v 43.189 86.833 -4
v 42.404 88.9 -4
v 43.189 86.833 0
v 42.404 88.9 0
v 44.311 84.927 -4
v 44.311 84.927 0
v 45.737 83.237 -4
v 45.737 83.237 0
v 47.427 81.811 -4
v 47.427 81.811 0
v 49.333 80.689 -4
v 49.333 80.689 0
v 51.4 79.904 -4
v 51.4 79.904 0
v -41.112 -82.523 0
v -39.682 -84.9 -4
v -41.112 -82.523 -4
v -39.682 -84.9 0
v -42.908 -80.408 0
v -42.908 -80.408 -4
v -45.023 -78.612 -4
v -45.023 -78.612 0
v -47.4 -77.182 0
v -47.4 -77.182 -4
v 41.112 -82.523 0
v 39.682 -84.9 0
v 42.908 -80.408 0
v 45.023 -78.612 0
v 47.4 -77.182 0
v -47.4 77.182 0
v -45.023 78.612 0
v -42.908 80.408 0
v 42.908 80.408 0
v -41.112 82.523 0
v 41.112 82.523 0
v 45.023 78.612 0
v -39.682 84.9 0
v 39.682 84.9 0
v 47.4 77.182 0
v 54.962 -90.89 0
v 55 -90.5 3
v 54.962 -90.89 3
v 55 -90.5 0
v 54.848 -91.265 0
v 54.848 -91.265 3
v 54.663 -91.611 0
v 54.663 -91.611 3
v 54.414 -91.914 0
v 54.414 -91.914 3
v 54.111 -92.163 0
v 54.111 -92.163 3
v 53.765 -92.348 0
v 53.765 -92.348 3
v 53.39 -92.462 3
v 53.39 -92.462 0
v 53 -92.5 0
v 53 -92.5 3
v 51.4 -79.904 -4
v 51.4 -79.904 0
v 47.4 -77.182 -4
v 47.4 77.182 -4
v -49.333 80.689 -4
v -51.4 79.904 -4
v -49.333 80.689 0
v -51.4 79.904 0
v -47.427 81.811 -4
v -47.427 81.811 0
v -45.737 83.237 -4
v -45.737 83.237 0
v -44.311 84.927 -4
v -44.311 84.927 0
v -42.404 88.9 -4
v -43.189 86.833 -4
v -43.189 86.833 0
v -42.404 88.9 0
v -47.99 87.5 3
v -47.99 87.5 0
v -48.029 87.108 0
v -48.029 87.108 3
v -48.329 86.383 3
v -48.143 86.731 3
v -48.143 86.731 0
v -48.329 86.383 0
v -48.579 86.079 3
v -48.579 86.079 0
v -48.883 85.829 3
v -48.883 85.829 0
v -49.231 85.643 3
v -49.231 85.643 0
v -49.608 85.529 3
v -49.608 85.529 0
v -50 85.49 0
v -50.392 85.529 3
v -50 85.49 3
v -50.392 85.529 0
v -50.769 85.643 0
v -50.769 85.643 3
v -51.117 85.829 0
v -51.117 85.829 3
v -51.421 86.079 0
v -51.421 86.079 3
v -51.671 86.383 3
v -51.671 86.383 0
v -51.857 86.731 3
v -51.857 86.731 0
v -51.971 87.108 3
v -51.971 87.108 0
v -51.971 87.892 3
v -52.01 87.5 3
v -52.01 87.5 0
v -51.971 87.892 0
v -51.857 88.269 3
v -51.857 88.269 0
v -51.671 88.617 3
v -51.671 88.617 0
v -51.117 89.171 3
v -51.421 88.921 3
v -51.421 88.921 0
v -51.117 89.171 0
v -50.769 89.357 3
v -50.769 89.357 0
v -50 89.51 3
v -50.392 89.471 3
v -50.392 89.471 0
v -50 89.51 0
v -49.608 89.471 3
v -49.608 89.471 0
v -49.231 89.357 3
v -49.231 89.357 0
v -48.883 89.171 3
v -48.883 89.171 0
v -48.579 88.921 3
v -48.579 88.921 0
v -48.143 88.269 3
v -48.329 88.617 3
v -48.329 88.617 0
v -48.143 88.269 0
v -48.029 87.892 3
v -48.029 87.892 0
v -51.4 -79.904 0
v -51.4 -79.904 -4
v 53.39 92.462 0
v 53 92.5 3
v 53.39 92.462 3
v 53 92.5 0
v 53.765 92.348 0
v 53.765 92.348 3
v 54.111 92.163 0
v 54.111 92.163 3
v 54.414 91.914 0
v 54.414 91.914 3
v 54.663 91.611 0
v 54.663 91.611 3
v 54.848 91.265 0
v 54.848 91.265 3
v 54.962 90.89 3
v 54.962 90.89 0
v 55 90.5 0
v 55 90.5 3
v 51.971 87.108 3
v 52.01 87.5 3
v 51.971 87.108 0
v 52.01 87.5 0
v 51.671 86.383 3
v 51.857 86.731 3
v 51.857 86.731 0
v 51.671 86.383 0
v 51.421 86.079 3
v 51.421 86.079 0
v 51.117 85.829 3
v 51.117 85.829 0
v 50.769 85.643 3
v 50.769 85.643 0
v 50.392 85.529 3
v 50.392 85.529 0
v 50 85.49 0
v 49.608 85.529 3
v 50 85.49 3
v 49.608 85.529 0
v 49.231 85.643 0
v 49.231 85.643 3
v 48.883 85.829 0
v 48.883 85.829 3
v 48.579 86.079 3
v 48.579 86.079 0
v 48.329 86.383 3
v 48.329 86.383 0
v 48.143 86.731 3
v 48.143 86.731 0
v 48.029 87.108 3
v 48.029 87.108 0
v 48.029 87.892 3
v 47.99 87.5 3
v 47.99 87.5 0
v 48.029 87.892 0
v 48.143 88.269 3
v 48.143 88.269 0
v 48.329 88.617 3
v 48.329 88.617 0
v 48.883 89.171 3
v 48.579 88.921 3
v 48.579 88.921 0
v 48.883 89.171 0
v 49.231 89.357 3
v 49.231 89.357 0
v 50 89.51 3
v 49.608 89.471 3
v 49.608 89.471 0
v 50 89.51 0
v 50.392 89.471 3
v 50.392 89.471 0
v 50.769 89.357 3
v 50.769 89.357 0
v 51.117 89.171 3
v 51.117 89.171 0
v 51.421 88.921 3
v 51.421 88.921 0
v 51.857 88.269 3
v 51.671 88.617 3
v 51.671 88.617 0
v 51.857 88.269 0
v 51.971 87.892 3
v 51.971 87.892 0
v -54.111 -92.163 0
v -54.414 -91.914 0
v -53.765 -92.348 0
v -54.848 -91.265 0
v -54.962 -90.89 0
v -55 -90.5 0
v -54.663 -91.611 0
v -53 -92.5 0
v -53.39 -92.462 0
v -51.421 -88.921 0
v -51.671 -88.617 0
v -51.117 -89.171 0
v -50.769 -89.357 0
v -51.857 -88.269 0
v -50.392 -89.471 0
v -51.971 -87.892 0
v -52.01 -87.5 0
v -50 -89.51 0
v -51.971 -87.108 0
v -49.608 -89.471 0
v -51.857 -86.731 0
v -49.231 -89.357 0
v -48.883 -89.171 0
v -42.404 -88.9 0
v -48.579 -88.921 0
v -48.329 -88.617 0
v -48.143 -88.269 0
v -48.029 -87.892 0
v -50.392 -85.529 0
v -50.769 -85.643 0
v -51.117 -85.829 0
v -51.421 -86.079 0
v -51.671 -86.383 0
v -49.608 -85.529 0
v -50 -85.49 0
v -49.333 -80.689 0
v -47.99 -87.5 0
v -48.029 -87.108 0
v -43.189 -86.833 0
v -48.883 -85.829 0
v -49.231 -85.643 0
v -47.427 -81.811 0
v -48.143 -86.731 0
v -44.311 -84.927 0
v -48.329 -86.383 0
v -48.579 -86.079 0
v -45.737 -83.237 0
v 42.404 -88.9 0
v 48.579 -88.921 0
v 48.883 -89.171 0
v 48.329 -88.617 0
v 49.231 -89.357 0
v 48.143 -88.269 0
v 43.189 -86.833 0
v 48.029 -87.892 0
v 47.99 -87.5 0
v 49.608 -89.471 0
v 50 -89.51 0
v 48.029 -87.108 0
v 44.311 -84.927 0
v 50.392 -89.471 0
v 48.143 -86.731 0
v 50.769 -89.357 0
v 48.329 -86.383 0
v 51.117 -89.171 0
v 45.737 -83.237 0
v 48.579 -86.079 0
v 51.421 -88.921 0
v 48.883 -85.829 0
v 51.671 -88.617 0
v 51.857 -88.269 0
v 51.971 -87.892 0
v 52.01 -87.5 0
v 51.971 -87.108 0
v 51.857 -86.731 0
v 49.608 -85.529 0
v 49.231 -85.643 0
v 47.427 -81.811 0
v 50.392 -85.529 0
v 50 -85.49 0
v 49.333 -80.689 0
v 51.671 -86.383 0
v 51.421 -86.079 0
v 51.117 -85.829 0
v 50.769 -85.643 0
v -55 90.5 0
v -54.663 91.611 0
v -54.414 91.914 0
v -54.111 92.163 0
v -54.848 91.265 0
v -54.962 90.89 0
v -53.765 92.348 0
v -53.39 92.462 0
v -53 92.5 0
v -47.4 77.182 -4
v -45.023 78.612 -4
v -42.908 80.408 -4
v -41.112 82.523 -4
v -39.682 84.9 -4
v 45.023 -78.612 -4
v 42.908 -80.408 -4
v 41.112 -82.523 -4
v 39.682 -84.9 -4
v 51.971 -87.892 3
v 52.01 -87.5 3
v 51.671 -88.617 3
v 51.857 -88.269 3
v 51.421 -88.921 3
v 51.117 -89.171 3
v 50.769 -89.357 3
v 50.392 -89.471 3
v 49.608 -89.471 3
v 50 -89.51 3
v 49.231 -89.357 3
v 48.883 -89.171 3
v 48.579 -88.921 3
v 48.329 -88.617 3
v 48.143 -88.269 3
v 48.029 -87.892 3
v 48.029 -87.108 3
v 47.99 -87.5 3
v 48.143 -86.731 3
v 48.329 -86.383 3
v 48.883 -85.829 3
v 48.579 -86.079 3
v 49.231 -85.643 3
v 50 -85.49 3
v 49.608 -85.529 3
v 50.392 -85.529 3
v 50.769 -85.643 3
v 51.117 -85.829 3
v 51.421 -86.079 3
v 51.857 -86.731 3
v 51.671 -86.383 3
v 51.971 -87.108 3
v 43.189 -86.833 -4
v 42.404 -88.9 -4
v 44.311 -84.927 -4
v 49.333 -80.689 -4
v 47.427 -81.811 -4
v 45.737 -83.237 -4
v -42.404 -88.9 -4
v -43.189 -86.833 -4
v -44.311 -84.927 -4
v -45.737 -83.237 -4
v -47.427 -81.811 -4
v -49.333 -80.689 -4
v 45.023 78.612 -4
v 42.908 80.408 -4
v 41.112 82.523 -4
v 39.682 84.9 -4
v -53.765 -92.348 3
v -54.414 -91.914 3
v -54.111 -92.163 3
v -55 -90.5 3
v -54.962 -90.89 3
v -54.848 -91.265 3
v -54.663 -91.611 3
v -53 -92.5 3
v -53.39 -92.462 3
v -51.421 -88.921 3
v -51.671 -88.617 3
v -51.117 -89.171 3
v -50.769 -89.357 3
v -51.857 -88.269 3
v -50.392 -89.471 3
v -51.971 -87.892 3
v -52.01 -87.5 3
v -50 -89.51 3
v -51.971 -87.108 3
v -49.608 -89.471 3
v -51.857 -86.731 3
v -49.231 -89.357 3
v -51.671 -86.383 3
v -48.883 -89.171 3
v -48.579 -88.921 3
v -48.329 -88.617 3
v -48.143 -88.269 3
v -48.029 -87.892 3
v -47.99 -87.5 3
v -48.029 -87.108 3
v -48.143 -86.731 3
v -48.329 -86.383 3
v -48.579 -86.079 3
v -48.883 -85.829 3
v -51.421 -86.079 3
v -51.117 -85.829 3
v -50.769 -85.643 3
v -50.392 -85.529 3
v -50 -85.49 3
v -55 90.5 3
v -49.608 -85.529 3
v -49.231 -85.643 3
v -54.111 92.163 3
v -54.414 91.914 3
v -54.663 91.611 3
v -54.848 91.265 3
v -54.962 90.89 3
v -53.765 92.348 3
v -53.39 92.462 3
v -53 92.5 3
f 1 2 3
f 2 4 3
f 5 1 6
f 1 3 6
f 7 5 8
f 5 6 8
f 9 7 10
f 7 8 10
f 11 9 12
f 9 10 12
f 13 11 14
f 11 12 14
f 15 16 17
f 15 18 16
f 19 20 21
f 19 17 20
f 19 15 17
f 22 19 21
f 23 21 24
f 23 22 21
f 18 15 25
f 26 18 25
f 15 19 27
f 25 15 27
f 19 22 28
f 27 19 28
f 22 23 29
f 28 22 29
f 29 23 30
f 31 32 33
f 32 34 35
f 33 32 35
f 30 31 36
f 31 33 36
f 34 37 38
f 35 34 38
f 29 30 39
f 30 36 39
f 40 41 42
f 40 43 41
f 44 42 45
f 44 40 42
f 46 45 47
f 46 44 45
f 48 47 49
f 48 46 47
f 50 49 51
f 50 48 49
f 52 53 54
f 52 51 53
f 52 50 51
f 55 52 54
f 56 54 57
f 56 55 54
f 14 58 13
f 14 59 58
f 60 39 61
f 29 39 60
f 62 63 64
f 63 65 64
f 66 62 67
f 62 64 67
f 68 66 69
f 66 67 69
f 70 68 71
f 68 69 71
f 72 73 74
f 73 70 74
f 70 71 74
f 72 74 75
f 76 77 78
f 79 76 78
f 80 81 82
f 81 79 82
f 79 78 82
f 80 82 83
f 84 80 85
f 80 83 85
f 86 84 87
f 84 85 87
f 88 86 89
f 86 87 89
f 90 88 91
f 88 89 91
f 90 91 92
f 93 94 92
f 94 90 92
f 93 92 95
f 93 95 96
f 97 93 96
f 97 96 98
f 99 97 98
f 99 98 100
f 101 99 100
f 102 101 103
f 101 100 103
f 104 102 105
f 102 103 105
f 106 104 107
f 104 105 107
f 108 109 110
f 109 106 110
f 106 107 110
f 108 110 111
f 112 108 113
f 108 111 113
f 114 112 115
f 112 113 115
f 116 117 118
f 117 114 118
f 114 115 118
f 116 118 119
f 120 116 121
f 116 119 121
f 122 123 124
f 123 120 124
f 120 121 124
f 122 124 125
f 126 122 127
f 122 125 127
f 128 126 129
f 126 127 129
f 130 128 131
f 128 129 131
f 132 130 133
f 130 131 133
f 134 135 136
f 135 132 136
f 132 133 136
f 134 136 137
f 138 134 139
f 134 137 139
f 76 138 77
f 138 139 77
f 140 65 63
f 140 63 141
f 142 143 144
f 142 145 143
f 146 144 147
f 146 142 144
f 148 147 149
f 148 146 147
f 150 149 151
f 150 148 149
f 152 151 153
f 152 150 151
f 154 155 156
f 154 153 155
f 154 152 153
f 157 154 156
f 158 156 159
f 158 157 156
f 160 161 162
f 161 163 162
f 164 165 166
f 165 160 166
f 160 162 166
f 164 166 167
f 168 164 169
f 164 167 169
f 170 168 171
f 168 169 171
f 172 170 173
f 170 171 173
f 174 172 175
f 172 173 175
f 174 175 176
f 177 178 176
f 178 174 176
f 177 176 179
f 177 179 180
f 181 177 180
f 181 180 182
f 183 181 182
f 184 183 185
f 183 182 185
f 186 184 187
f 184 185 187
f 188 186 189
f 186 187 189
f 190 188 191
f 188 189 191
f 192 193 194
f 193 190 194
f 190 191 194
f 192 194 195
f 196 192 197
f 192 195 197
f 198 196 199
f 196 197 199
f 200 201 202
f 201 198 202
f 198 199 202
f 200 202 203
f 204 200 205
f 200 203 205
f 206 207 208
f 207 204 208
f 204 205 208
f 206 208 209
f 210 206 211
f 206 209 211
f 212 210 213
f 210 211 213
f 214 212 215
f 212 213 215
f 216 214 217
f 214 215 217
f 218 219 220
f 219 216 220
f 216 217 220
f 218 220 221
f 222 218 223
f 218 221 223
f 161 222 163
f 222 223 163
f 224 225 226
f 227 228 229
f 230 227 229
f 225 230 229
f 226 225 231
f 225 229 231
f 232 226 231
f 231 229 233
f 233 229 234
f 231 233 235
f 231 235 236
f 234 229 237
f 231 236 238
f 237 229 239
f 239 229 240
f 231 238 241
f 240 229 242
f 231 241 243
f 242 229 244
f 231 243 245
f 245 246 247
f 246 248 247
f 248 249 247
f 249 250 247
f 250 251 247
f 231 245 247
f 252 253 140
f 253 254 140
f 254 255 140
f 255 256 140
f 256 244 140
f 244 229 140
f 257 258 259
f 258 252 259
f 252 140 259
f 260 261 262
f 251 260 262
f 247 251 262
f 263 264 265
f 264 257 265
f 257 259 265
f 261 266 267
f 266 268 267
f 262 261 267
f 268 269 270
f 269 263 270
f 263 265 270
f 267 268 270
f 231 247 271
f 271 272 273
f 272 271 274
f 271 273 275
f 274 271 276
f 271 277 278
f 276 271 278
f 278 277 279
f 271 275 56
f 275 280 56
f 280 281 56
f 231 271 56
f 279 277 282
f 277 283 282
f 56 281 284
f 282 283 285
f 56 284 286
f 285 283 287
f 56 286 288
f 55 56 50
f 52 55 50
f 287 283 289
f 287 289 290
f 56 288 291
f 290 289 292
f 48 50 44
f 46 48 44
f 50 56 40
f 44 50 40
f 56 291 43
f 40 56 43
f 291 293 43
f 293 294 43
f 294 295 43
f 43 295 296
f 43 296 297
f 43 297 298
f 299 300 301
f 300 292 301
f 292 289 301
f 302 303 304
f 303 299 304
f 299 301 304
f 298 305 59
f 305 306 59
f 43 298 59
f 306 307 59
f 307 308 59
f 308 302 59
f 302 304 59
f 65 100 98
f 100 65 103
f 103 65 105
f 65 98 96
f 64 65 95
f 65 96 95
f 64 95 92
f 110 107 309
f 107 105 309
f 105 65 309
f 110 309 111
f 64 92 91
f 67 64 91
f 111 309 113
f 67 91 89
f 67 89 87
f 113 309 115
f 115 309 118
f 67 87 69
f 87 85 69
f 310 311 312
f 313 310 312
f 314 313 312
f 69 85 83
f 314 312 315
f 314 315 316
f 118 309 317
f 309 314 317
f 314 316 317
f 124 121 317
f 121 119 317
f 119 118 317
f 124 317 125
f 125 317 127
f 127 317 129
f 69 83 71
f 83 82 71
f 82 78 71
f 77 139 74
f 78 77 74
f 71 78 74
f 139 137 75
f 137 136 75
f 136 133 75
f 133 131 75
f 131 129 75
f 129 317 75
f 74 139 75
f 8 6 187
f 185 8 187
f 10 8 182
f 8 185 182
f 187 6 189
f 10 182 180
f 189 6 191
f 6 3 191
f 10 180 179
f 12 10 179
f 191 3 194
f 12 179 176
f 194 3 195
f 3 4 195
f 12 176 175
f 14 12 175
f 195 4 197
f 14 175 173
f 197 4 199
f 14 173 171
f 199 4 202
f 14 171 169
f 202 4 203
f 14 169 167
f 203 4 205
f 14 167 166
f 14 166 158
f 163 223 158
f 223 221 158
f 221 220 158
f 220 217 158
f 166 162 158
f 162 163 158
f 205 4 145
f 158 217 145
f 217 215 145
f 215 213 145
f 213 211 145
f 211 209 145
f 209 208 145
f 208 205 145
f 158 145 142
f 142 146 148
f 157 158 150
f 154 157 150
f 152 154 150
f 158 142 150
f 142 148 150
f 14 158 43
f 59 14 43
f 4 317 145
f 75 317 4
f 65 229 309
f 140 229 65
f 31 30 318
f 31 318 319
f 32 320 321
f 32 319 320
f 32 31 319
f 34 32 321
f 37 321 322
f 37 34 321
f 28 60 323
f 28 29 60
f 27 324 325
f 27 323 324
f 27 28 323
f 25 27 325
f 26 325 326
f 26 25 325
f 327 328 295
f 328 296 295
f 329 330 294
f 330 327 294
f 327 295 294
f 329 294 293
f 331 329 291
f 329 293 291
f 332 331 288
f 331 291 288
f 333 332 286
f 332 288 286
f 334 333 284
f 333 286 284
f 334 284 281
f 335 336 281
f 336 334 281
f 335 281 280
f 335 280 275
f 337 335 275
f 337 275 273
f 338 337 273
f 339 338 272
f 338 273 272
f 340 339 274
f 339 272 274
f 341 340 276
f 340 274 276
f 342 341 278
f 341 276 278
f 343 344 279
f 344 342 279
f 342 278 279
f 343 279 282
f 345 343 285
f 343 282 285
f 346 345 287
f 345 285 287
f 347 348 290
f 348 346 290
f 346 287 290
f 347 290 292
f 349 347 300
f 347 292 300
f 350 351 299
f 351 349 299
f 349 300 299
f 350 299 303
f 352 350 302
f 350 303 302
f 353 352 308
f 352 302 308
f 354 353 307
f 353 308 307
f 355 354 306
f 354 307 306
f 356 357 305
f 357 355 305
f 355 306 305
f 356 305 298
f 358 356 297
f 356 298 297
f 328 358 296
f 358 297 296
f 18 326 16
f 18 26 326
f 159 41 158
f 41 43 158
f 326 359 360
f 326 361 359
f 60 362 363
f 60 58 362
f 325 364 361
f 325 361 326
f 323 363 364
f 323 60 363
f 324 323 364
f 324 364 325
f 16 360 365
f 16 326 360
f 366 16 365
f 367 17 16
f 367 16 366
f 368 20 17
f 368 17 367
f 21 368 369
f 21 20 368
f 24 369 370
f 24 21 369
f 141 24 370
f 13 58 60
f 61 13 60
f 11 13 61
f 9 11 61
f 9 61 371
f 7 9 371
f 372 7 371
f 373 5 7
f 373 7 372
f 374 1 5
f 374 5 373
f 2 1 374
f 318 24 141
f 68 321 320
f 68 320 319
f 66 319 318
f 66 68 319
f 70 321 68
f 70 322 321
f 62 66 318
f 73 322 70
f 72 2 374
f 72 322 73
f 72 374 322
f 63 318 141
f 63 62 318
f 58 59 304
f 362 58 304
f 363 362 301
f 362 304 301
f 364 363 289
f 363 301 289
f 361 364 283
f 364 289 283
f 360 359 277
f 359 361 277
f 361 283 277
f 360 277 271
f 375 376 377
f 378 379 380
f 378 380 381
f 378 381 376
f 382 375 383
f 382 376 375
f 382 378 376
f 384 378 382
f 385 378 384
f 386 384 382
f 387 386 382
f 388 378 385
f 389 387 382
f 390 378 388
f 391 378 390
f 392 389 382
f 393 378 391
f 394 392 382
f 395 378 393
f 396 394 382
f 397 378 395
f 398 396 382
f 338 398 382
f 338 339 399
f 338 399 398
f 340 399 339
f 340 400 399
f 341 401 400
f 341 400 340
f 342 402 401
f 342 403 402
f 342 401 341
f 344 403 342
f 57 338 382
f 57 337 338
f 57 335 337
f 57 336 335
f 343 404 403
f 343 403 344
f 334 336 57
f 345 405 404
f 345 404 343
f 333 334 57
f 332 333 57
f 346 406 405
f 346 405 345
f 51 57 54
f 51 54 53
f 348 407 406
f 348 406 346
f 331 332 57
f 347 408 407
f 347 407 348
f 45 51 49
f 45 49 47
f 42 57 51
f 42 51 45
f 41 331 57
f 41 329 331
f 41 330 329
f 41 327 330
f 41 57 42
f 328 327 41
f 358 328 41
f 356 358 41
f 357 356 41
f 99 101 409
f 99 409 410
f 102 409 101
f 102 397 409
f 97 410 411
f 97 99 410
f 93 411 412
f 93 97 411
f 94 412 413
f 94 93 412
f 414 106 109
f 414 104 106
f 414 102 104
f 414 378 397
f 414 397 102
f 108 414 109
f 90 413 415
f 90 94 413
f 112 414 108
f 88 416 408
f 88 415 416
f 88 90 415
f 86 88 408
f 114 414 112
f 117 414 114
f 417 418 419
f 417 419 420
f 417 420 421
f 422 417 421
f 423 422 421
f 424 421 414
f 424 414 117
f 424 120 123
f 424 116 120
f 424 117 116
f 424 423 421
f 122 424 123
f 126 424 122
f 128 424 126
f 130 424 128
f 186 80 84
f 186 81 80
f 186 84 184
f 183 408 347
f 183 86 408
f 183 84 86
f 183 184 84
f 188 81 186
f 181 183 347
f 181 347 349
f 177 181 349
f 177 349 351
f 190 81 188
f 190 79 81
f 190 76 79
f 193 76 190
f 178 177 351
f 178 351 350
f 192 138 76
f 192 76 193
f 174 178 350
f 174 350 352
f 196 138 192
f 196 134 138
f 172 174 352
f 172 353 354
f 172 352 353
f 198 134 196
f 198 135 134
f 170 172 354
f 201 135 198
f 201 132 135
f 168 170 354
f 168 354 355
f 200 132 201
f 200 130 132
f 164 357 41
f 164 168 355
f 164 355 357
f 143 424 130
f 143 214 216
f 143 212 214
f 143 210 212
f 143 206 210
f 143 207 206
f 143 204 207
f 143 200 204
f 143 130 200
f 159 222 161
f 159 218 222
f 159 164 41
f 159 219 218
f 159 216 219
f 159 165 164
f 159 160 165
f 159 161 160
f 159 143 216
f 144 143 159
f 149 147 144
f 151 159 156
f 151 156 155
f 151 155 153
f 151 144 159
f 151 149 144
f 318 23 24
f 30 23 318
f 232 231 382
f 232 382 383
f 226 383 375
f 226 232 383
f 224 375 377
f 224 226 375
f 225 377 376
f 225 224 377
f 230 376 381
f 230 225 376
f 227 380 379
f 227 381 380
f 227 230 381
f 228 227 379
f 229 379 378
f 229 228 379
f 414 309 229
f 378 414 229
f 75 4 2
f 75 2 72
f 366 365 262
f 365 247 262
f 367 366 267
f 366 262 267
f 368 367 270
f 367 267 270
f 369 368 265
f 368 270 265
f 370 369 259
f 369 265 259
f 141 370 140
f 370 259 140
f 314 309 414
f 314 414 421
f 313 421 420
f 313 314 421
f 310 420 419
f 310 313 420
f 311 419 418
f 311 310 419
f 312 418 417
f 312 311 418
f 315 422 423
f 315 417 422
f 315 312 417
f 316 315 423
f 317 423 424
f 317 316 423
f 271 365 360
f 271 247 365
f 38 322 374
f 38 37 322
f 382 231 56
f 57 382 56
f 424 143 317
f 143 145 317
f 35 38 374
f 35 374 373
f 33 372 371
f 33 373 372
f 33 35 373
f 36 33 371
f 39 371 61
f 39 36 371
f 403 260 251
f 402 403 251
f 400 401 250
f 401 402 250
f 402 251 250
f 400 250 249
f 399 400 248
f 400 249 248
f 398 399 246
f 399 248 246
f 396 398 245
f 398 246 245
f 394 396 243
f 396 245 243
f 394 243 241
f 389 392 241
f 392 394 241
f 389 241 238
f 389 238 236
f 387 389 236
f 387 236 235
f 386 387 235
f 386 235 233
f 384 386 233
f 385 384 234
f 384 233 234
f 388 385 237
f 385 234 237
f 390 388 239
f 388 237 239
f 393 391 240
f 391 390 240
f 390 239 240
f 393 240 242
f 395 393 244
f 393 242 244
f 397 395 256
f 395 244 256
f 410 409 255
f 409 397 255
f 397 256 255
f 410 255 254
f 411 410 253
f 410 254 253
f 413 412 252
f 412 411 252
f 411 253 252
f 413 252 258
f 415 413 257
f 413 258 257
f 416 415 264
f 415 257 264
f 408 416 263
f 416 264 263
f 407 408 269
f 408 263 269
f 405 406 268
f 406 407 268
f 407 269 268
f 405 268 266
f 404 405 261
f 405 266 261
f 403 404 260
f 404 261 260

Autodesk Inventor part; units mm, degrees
ref_plane "YZ Plane" through (0, 0, 0) normal (1, 0, 0) x (0, 1, 0)
ref_plane "XZ Plane" through (0, 0, 0) normal (0, 1, 0) x (-1, 0, 0)
ref_plane "XY Plane" through (0, 0, 0) normal (0, 0, 1) x (1, 0, 0)
sketch "Sketch1" plane through (0, 0, 0) normal (0, 0, 1) x (1, 0, 0)
  circle A0 centre (50, 87.5) radius 2.01 projected
  circle A1 centre (50, -87.5) radius 2.01 projected
  line L0 (55, -90.5) -> (55, 90.5) projected
  arc A2 (55, 90.5) -> (53, 92.5) centre (53, 90.5) ccw projected
  line L1 (53, 92.5) -> (-53, 92.5) projected
  arc A3 (-53, 92.5) -> (-55, 90.5) centre (-53, 90.5) ccw projected
  line L2 (-55, 90.5) -> (-55, -90.5) projected
  arc A4 (-55, -90.5) -> (-53, -92.5) centre (-53, -90.5) ccw projected
  line L3 (-53, -92.5) -> (53, -92.5) projected
  arc A5 (53, -92.5) -> (55, -90.5) centre (53, -90.5) ccw projected
  circle A6 centre (-50, 87.5) radius 2.01 projected
  circle A7 centre (-50, -87.5) radius 2.01 projected
ref_plane "Work Plane1" through (0, 0, 0) normal (0, 0, -1) x (-1, 0, 0)
sketch "Sketch2" plane through (0, 0, 0) normal (0, 0, -1) x (-1, 0, 0)
  arc A0 (42.8653, 89.5) -> (52, 80.3653) centre (55, 92.5) ccw projected
  line L0 (42.8653, 89.5) -> (-42.8653, 89.5) projected
  arc A1 (-52, 80.3653) -> (-42.8653, 89.5) centre (-55, 92.5) ccw projected
  line L1 (-52, 80.3653) -> (-52, -80.3653) projected
  line L2 (52, -80.3653) -> (52, 80.3653) projected
  arc A2 (52, -80.3653) -> (42.8653, -89.5) centre (55, -92.5) ccw projected
  line L3 (-42.8653, -89.5) -> (42.8653, -89.5) projected
  arc A3 (-42.8653, -89.5) -> (-52, -80.3653) centre (-55, -92.5) ccw projected
  line L4 (-42.4044, 88.9) -> (42.4044, 88.9)
  arc A4 (42.4044, 88.9) -> (51.4, 79.9044) centre (55, 92.5) ccw
  line L5 (51.4, 79.9044) -> (51.4, -79.9044)
  arc A5 (51.4, -79.9044) -> (42.4044, -88.9) centre (55, -92.5) ccw
  line L6 (42.4044, -88.9) -> (-42.4044, -88.9)
  arc A6 (-42.4044, -88.9) -> (-51.4, -79.9044) centre (-55, -92.5) ccw
  line L7 (-51.4, -79.9044) -> (-51.4, 79.9044)
  arc A7 (-51.4, 79.9044) -> (-42.4044, 88.9) centre (-55, 92.5) ccw
  line L8 (39.6817, 84.9) -> (-39.6817, 84.9)
  arc A8 (-47.4, 77.1817) -> (-39.6817, 84.9) centre (-55, 92.5) ccw
  line L9 (-47.4, 77.1817) -> (-47.4, -77.1817)
  arc A9 (-39.6817, -84.9) -> (-47.4, -77.1817) centre (-55, -92.5) ccw
  line L10 (-39.6817, -84.9) -> (39.6817, -84.9)
  arc A10 (47.4, -77.1817) -> (39.6817, -84.9) centre (55, -92.5) ccw
  line L11 (47.4, -77.1817) -> (47.4, 77.1817)
  arc A11 (39.6817, 84.9) -> (47.4, 77.1817) centre (55, 92.5) ccw
  point P0 (-50, -92.5)
  point P1 (50, -92.5)
  point P2 (50, 92.5)
  point P3 (-50, 92.5)
  dimension "d11" = 0.6
  dimension "d12" = 4
extrude "Extrusion2" add sketch "Sketch2" along normal blind 4 contours L4 A4 L5 A5 L6 A6 L7 A7
extrude "Extrusion3" add sketch "Sketch1" along normal blind 3
properties part number "Tampa caixa principal"
